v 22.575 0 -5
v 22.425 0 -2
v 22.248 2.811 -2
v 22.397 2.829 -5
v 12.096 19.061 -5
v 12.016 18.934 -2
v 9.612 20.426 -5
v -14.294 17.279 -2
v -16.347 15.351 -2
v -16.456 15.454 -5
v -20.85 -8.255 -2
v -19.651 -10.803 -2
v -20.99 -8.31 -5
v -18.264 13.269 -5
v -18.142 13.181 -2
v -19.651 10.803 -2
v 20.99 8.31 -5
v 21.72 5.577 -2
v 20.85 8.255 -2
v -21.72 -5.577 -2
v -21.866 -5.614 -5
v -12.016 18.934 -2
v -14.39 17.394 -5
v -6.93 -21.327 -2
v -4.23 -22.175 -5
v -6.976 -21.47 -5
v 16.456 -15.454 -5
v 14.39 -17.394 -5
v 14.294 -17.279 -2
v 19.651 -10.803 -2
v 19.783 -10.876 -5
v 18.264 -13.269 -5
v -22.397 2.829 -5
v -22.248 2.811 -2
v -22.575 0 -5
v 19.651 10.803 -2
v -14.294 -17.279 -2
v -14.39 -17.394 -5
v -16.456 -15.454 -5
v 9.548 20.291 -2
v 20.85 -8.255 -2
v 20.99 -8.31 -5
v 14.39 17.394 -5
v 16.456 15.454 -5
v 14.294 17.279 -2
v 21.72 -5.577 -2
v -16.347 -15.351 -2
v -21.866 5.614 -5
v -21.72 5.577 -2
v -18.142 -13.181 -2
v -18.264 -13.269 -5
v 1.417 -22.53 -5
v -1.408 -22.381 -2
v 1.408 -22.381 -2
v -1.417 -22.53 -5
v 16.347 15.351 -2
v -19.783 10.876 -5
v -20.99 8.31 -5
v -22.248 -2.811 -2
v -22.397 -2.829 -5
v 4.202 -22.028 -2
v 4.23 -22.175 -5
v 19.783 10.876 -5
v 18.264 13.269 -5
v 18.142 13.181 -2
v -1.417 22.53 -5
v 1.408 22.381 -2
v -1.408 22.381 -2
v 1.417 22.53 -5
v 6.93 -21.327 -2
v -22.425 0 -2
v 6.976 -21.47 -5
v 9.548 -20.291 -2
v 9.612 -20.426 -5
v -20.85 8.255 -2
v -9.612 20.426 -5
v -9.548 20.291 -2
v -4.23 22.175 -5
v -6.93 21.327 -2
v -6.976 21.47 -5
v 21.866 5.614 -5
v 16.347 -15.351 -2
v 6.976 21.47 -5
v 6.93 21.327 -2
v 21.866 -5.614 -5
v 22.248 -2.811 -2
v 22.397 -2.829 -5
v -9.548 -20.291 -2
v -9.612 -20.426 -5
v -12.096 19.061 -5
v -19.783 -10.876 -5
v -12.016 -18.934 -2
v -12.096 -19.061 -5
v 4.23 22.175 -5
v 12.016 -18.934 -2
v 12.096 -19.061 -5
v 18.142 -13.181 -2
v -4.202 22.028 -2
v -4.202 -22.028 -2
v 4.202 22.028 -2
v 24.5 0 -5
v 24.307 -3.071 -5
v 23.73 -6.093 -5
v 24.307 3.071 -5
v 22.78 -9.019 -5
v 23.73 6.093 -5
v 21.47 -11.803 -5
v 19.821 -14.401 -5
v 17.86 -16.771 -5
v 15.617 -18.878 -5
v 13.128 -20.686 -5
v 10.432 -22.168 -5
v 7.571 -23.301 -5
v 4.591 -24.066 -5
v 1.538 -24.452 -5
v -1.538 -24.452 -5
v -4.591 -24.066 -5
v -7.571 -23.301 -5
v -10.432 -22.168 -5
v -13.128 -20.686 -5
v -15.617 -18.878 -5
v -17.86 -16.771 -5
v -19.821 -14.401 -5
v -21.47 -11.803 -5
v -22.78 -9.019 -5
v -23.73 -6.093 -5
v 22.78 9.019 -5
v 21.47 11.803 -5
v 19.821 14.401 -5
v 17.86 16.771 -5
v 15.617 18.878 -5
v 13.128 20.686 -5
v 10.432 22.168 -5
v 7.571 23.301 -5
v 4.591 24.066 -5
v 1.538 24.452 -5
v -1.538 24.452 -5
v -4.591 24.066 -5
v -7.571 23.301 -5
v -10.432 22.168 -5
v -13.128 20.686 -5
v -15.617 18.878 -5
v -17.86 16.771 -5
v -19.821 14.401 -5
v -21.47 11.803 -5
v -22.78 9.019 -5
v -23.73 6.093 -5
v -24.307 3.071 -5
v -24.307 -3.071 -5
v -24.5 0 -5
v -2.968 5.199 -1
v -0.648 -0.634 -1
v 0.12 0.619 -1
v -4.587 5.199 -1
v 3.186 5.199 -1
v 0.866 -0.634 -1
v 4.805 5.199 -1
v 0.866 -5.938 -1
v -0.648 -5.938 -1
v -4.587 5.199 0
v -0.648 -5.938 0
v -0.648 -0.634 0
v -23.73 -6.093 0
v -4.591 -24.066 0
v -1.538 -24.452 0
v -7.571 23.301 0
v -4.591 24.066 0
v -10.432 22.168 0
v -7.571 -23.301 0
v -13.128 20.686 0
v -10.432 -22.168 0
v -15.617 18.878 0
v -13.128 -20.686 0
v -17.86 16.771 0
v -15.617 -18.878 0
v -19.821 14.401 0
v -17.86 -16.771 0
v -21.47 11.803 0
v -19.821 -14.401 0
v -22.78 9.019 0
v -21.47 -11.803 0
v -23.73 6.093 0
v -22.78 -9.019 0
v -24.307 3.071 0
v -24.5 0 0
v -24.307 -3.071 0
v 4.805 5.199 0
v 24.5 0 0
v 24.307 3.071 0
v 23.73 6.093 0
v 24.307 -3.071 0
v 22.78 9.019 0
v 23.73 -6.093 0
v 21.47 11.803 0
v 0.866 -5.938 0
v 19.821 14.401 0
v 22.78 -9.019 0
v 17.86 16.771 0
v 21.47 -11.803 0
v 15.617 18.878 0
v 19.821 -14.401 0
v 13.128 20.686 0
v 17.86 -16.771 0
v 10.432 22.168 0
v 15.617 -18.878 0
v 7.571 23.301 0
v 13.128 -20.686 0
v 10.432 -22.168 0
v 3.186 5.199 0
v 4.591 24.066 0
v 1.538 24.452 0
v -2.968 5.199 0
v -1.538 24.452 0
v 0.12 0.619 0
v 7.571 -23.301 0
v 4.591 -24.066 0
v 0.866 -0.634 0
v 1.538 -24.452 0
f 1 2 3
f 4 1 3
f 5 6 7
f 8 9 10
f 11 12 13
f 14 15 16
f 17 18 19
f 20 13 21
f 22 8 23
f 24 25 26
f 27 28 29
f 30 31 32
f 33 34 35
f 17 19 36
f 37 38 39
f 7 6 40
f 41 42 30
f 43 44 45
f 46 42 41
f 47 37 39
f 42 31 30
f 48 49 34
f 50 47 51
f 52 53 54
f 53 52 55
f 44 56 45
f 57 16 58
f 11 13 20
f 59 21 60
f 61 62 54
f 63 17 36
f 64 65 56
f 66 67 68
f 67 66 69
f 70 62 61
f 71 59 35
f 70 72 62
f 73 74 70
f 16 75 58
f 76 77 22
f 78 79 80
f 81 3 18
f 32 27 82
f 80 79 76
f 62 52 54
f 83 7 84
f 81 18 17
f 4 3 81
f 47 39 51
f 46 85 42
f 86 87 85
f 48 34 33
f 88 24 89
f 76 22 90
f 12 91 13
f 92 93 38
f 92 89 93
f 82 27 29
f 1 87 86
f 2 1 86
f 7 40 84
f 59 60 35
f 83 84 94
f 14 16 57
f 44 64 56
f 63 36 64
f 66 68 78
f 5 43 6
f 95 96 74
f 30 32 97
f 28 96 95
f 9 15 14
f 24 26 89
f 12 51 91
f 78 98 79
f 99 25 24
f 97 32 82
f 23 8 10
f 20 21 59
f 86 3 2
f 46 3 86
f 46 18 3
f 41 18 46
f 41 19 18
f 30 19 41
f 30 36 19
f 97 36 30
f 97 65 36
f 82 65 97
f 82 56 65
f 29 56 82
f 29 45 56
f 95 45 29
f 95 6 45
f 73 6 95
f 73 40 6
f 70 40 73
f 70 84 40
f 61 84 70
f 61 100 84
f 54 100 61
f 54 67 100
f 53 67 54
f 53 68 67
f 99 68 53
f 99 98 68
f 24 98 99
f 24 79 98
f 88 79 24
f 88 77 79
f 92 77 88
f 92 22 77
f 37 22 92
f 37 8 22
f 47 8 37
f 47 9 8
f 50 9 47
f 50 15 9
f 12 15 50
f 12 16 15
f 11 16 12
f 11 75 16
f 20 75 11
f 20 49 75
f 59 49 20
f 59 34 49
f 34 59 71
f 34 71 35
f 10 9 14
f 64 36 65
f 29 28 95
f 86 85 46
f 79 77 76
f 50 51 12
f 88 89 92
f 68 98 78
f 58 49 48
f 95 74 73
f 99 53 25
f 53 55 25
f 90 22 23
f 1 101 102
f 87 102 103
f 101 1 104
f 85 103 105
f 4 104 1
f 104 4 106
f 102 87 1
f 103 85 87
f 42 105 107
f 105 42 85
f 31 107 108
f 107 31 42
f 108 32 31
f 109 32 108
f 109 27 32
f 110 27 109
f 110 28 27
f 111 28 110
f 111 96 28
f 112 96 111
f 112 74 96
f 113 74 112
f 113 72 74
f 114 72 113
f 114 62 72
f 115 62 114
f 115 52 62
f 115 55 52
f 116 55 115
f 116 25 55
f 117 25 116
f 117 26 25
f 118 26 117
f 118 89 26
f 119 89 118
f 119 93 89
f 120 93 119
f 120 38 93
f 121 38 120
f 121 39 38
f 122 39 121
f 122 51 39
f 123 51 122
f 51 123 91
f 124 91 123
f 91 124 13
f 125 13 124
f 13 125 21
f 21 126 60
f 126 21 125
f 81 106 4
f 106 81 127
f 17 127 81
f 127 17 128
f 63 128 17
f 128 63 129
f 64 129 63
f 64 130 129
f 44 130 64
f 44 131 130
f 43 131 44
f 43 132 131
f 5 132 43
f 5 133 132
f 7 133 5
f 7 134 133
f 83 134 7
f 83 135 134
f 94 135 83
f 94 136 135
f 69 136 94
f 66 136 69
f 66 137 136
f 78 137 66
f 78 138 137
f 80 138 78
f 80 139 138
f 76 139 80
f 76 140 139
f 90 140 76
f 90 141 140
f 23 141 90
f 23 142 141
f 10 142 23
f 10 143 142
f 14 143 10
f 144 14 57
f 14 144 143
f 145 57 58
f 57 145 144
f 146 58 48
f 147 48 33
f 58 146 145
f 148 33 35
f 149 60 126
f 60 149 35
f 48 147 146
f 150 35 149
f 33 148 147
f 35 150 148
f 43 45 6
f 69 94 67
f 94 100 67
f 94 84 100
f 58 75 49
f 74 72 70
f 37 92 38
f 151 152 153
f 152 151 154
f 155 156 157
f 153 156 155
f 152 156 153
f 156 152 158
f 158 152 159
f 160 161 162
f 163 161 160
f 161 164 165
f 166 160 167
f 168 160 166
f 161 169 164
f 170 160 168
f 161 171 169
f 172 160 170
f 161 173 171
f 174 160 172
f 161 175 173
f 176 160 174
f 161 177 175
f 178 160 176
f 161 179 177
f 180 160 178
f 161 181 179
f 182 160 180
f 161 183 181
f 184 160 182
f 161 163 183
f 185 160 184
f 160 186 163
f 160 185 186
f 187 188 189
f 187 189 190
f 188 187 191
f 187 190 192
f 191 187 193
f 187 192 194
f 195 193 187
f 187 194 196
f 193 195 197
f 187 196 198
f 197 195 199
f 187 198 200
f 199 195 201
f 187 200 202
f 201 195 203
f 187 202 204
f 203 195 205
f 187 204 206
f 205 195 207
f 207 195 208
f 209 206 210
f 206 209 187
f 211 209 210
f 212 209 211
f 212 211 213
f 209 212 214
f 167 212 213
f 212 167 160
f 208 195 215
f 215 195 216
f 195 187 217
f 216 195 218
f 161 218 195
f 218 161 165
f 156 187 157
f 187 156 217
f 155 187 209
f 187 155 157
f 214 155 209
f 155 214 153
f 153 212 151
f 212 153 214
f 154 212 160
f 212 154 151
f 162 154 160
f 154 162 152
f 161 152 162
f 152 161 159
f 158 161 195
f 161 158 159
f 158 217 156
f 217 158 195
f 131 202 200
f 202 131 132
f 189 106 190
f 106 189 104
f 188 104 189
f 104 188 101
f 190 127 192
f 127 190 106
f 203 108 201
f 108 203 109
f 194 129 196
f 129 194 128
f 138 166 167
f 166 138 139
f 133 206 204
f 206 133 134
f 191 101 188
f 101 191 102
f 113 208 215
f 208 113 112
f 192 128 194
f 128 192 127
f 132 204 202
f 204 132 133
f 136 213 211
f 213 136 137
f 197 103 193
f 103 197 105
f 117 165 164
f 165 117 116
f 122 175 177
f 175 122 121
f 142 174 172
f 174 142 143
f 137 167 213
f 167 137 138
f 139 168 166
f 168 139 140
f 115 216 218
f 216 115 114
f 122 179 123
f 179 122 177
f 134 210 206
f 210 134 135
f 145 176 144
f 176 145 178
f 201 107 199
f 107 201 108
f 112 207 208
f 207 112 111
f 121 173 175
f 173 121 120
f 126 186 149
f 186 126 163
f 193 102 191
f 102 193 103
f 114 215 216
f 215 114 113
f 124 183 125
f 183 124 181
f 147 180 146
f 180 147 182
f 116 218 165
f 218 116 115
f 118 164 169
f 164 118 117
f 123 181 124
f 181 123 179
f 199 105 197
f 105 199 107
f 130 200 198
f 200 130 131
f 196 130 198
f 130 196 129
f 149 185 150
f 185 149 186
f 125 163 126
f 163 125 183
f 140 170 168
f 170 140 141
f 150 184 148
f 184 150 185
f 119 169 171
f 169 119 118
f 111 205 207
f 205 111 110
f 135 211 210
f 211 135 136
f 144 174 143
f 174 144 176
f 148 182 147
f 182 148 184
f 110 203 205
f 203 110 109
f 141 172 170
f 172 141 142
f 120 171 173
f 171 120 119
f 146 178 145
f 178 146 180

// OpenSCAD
$fn = 50;

difference() {
	union() {
		translate(v = [0, 0, -5.0]) {
			cylinder(h = 5, r = 24.5);
		}
	}
	union() {
		#translate(v = [0, 0, -5.0]) {
			cylinder(h = 3, r1 = 22.575, r2 = 22.425);
		}
		translate(v = [0, -0.5, -1]) {
			linear_extrude(height = 1) {
				text(font = "Webdings", halign = "center", size = 11, text = "Y", valign = "center");
			}
		}
	}
}
